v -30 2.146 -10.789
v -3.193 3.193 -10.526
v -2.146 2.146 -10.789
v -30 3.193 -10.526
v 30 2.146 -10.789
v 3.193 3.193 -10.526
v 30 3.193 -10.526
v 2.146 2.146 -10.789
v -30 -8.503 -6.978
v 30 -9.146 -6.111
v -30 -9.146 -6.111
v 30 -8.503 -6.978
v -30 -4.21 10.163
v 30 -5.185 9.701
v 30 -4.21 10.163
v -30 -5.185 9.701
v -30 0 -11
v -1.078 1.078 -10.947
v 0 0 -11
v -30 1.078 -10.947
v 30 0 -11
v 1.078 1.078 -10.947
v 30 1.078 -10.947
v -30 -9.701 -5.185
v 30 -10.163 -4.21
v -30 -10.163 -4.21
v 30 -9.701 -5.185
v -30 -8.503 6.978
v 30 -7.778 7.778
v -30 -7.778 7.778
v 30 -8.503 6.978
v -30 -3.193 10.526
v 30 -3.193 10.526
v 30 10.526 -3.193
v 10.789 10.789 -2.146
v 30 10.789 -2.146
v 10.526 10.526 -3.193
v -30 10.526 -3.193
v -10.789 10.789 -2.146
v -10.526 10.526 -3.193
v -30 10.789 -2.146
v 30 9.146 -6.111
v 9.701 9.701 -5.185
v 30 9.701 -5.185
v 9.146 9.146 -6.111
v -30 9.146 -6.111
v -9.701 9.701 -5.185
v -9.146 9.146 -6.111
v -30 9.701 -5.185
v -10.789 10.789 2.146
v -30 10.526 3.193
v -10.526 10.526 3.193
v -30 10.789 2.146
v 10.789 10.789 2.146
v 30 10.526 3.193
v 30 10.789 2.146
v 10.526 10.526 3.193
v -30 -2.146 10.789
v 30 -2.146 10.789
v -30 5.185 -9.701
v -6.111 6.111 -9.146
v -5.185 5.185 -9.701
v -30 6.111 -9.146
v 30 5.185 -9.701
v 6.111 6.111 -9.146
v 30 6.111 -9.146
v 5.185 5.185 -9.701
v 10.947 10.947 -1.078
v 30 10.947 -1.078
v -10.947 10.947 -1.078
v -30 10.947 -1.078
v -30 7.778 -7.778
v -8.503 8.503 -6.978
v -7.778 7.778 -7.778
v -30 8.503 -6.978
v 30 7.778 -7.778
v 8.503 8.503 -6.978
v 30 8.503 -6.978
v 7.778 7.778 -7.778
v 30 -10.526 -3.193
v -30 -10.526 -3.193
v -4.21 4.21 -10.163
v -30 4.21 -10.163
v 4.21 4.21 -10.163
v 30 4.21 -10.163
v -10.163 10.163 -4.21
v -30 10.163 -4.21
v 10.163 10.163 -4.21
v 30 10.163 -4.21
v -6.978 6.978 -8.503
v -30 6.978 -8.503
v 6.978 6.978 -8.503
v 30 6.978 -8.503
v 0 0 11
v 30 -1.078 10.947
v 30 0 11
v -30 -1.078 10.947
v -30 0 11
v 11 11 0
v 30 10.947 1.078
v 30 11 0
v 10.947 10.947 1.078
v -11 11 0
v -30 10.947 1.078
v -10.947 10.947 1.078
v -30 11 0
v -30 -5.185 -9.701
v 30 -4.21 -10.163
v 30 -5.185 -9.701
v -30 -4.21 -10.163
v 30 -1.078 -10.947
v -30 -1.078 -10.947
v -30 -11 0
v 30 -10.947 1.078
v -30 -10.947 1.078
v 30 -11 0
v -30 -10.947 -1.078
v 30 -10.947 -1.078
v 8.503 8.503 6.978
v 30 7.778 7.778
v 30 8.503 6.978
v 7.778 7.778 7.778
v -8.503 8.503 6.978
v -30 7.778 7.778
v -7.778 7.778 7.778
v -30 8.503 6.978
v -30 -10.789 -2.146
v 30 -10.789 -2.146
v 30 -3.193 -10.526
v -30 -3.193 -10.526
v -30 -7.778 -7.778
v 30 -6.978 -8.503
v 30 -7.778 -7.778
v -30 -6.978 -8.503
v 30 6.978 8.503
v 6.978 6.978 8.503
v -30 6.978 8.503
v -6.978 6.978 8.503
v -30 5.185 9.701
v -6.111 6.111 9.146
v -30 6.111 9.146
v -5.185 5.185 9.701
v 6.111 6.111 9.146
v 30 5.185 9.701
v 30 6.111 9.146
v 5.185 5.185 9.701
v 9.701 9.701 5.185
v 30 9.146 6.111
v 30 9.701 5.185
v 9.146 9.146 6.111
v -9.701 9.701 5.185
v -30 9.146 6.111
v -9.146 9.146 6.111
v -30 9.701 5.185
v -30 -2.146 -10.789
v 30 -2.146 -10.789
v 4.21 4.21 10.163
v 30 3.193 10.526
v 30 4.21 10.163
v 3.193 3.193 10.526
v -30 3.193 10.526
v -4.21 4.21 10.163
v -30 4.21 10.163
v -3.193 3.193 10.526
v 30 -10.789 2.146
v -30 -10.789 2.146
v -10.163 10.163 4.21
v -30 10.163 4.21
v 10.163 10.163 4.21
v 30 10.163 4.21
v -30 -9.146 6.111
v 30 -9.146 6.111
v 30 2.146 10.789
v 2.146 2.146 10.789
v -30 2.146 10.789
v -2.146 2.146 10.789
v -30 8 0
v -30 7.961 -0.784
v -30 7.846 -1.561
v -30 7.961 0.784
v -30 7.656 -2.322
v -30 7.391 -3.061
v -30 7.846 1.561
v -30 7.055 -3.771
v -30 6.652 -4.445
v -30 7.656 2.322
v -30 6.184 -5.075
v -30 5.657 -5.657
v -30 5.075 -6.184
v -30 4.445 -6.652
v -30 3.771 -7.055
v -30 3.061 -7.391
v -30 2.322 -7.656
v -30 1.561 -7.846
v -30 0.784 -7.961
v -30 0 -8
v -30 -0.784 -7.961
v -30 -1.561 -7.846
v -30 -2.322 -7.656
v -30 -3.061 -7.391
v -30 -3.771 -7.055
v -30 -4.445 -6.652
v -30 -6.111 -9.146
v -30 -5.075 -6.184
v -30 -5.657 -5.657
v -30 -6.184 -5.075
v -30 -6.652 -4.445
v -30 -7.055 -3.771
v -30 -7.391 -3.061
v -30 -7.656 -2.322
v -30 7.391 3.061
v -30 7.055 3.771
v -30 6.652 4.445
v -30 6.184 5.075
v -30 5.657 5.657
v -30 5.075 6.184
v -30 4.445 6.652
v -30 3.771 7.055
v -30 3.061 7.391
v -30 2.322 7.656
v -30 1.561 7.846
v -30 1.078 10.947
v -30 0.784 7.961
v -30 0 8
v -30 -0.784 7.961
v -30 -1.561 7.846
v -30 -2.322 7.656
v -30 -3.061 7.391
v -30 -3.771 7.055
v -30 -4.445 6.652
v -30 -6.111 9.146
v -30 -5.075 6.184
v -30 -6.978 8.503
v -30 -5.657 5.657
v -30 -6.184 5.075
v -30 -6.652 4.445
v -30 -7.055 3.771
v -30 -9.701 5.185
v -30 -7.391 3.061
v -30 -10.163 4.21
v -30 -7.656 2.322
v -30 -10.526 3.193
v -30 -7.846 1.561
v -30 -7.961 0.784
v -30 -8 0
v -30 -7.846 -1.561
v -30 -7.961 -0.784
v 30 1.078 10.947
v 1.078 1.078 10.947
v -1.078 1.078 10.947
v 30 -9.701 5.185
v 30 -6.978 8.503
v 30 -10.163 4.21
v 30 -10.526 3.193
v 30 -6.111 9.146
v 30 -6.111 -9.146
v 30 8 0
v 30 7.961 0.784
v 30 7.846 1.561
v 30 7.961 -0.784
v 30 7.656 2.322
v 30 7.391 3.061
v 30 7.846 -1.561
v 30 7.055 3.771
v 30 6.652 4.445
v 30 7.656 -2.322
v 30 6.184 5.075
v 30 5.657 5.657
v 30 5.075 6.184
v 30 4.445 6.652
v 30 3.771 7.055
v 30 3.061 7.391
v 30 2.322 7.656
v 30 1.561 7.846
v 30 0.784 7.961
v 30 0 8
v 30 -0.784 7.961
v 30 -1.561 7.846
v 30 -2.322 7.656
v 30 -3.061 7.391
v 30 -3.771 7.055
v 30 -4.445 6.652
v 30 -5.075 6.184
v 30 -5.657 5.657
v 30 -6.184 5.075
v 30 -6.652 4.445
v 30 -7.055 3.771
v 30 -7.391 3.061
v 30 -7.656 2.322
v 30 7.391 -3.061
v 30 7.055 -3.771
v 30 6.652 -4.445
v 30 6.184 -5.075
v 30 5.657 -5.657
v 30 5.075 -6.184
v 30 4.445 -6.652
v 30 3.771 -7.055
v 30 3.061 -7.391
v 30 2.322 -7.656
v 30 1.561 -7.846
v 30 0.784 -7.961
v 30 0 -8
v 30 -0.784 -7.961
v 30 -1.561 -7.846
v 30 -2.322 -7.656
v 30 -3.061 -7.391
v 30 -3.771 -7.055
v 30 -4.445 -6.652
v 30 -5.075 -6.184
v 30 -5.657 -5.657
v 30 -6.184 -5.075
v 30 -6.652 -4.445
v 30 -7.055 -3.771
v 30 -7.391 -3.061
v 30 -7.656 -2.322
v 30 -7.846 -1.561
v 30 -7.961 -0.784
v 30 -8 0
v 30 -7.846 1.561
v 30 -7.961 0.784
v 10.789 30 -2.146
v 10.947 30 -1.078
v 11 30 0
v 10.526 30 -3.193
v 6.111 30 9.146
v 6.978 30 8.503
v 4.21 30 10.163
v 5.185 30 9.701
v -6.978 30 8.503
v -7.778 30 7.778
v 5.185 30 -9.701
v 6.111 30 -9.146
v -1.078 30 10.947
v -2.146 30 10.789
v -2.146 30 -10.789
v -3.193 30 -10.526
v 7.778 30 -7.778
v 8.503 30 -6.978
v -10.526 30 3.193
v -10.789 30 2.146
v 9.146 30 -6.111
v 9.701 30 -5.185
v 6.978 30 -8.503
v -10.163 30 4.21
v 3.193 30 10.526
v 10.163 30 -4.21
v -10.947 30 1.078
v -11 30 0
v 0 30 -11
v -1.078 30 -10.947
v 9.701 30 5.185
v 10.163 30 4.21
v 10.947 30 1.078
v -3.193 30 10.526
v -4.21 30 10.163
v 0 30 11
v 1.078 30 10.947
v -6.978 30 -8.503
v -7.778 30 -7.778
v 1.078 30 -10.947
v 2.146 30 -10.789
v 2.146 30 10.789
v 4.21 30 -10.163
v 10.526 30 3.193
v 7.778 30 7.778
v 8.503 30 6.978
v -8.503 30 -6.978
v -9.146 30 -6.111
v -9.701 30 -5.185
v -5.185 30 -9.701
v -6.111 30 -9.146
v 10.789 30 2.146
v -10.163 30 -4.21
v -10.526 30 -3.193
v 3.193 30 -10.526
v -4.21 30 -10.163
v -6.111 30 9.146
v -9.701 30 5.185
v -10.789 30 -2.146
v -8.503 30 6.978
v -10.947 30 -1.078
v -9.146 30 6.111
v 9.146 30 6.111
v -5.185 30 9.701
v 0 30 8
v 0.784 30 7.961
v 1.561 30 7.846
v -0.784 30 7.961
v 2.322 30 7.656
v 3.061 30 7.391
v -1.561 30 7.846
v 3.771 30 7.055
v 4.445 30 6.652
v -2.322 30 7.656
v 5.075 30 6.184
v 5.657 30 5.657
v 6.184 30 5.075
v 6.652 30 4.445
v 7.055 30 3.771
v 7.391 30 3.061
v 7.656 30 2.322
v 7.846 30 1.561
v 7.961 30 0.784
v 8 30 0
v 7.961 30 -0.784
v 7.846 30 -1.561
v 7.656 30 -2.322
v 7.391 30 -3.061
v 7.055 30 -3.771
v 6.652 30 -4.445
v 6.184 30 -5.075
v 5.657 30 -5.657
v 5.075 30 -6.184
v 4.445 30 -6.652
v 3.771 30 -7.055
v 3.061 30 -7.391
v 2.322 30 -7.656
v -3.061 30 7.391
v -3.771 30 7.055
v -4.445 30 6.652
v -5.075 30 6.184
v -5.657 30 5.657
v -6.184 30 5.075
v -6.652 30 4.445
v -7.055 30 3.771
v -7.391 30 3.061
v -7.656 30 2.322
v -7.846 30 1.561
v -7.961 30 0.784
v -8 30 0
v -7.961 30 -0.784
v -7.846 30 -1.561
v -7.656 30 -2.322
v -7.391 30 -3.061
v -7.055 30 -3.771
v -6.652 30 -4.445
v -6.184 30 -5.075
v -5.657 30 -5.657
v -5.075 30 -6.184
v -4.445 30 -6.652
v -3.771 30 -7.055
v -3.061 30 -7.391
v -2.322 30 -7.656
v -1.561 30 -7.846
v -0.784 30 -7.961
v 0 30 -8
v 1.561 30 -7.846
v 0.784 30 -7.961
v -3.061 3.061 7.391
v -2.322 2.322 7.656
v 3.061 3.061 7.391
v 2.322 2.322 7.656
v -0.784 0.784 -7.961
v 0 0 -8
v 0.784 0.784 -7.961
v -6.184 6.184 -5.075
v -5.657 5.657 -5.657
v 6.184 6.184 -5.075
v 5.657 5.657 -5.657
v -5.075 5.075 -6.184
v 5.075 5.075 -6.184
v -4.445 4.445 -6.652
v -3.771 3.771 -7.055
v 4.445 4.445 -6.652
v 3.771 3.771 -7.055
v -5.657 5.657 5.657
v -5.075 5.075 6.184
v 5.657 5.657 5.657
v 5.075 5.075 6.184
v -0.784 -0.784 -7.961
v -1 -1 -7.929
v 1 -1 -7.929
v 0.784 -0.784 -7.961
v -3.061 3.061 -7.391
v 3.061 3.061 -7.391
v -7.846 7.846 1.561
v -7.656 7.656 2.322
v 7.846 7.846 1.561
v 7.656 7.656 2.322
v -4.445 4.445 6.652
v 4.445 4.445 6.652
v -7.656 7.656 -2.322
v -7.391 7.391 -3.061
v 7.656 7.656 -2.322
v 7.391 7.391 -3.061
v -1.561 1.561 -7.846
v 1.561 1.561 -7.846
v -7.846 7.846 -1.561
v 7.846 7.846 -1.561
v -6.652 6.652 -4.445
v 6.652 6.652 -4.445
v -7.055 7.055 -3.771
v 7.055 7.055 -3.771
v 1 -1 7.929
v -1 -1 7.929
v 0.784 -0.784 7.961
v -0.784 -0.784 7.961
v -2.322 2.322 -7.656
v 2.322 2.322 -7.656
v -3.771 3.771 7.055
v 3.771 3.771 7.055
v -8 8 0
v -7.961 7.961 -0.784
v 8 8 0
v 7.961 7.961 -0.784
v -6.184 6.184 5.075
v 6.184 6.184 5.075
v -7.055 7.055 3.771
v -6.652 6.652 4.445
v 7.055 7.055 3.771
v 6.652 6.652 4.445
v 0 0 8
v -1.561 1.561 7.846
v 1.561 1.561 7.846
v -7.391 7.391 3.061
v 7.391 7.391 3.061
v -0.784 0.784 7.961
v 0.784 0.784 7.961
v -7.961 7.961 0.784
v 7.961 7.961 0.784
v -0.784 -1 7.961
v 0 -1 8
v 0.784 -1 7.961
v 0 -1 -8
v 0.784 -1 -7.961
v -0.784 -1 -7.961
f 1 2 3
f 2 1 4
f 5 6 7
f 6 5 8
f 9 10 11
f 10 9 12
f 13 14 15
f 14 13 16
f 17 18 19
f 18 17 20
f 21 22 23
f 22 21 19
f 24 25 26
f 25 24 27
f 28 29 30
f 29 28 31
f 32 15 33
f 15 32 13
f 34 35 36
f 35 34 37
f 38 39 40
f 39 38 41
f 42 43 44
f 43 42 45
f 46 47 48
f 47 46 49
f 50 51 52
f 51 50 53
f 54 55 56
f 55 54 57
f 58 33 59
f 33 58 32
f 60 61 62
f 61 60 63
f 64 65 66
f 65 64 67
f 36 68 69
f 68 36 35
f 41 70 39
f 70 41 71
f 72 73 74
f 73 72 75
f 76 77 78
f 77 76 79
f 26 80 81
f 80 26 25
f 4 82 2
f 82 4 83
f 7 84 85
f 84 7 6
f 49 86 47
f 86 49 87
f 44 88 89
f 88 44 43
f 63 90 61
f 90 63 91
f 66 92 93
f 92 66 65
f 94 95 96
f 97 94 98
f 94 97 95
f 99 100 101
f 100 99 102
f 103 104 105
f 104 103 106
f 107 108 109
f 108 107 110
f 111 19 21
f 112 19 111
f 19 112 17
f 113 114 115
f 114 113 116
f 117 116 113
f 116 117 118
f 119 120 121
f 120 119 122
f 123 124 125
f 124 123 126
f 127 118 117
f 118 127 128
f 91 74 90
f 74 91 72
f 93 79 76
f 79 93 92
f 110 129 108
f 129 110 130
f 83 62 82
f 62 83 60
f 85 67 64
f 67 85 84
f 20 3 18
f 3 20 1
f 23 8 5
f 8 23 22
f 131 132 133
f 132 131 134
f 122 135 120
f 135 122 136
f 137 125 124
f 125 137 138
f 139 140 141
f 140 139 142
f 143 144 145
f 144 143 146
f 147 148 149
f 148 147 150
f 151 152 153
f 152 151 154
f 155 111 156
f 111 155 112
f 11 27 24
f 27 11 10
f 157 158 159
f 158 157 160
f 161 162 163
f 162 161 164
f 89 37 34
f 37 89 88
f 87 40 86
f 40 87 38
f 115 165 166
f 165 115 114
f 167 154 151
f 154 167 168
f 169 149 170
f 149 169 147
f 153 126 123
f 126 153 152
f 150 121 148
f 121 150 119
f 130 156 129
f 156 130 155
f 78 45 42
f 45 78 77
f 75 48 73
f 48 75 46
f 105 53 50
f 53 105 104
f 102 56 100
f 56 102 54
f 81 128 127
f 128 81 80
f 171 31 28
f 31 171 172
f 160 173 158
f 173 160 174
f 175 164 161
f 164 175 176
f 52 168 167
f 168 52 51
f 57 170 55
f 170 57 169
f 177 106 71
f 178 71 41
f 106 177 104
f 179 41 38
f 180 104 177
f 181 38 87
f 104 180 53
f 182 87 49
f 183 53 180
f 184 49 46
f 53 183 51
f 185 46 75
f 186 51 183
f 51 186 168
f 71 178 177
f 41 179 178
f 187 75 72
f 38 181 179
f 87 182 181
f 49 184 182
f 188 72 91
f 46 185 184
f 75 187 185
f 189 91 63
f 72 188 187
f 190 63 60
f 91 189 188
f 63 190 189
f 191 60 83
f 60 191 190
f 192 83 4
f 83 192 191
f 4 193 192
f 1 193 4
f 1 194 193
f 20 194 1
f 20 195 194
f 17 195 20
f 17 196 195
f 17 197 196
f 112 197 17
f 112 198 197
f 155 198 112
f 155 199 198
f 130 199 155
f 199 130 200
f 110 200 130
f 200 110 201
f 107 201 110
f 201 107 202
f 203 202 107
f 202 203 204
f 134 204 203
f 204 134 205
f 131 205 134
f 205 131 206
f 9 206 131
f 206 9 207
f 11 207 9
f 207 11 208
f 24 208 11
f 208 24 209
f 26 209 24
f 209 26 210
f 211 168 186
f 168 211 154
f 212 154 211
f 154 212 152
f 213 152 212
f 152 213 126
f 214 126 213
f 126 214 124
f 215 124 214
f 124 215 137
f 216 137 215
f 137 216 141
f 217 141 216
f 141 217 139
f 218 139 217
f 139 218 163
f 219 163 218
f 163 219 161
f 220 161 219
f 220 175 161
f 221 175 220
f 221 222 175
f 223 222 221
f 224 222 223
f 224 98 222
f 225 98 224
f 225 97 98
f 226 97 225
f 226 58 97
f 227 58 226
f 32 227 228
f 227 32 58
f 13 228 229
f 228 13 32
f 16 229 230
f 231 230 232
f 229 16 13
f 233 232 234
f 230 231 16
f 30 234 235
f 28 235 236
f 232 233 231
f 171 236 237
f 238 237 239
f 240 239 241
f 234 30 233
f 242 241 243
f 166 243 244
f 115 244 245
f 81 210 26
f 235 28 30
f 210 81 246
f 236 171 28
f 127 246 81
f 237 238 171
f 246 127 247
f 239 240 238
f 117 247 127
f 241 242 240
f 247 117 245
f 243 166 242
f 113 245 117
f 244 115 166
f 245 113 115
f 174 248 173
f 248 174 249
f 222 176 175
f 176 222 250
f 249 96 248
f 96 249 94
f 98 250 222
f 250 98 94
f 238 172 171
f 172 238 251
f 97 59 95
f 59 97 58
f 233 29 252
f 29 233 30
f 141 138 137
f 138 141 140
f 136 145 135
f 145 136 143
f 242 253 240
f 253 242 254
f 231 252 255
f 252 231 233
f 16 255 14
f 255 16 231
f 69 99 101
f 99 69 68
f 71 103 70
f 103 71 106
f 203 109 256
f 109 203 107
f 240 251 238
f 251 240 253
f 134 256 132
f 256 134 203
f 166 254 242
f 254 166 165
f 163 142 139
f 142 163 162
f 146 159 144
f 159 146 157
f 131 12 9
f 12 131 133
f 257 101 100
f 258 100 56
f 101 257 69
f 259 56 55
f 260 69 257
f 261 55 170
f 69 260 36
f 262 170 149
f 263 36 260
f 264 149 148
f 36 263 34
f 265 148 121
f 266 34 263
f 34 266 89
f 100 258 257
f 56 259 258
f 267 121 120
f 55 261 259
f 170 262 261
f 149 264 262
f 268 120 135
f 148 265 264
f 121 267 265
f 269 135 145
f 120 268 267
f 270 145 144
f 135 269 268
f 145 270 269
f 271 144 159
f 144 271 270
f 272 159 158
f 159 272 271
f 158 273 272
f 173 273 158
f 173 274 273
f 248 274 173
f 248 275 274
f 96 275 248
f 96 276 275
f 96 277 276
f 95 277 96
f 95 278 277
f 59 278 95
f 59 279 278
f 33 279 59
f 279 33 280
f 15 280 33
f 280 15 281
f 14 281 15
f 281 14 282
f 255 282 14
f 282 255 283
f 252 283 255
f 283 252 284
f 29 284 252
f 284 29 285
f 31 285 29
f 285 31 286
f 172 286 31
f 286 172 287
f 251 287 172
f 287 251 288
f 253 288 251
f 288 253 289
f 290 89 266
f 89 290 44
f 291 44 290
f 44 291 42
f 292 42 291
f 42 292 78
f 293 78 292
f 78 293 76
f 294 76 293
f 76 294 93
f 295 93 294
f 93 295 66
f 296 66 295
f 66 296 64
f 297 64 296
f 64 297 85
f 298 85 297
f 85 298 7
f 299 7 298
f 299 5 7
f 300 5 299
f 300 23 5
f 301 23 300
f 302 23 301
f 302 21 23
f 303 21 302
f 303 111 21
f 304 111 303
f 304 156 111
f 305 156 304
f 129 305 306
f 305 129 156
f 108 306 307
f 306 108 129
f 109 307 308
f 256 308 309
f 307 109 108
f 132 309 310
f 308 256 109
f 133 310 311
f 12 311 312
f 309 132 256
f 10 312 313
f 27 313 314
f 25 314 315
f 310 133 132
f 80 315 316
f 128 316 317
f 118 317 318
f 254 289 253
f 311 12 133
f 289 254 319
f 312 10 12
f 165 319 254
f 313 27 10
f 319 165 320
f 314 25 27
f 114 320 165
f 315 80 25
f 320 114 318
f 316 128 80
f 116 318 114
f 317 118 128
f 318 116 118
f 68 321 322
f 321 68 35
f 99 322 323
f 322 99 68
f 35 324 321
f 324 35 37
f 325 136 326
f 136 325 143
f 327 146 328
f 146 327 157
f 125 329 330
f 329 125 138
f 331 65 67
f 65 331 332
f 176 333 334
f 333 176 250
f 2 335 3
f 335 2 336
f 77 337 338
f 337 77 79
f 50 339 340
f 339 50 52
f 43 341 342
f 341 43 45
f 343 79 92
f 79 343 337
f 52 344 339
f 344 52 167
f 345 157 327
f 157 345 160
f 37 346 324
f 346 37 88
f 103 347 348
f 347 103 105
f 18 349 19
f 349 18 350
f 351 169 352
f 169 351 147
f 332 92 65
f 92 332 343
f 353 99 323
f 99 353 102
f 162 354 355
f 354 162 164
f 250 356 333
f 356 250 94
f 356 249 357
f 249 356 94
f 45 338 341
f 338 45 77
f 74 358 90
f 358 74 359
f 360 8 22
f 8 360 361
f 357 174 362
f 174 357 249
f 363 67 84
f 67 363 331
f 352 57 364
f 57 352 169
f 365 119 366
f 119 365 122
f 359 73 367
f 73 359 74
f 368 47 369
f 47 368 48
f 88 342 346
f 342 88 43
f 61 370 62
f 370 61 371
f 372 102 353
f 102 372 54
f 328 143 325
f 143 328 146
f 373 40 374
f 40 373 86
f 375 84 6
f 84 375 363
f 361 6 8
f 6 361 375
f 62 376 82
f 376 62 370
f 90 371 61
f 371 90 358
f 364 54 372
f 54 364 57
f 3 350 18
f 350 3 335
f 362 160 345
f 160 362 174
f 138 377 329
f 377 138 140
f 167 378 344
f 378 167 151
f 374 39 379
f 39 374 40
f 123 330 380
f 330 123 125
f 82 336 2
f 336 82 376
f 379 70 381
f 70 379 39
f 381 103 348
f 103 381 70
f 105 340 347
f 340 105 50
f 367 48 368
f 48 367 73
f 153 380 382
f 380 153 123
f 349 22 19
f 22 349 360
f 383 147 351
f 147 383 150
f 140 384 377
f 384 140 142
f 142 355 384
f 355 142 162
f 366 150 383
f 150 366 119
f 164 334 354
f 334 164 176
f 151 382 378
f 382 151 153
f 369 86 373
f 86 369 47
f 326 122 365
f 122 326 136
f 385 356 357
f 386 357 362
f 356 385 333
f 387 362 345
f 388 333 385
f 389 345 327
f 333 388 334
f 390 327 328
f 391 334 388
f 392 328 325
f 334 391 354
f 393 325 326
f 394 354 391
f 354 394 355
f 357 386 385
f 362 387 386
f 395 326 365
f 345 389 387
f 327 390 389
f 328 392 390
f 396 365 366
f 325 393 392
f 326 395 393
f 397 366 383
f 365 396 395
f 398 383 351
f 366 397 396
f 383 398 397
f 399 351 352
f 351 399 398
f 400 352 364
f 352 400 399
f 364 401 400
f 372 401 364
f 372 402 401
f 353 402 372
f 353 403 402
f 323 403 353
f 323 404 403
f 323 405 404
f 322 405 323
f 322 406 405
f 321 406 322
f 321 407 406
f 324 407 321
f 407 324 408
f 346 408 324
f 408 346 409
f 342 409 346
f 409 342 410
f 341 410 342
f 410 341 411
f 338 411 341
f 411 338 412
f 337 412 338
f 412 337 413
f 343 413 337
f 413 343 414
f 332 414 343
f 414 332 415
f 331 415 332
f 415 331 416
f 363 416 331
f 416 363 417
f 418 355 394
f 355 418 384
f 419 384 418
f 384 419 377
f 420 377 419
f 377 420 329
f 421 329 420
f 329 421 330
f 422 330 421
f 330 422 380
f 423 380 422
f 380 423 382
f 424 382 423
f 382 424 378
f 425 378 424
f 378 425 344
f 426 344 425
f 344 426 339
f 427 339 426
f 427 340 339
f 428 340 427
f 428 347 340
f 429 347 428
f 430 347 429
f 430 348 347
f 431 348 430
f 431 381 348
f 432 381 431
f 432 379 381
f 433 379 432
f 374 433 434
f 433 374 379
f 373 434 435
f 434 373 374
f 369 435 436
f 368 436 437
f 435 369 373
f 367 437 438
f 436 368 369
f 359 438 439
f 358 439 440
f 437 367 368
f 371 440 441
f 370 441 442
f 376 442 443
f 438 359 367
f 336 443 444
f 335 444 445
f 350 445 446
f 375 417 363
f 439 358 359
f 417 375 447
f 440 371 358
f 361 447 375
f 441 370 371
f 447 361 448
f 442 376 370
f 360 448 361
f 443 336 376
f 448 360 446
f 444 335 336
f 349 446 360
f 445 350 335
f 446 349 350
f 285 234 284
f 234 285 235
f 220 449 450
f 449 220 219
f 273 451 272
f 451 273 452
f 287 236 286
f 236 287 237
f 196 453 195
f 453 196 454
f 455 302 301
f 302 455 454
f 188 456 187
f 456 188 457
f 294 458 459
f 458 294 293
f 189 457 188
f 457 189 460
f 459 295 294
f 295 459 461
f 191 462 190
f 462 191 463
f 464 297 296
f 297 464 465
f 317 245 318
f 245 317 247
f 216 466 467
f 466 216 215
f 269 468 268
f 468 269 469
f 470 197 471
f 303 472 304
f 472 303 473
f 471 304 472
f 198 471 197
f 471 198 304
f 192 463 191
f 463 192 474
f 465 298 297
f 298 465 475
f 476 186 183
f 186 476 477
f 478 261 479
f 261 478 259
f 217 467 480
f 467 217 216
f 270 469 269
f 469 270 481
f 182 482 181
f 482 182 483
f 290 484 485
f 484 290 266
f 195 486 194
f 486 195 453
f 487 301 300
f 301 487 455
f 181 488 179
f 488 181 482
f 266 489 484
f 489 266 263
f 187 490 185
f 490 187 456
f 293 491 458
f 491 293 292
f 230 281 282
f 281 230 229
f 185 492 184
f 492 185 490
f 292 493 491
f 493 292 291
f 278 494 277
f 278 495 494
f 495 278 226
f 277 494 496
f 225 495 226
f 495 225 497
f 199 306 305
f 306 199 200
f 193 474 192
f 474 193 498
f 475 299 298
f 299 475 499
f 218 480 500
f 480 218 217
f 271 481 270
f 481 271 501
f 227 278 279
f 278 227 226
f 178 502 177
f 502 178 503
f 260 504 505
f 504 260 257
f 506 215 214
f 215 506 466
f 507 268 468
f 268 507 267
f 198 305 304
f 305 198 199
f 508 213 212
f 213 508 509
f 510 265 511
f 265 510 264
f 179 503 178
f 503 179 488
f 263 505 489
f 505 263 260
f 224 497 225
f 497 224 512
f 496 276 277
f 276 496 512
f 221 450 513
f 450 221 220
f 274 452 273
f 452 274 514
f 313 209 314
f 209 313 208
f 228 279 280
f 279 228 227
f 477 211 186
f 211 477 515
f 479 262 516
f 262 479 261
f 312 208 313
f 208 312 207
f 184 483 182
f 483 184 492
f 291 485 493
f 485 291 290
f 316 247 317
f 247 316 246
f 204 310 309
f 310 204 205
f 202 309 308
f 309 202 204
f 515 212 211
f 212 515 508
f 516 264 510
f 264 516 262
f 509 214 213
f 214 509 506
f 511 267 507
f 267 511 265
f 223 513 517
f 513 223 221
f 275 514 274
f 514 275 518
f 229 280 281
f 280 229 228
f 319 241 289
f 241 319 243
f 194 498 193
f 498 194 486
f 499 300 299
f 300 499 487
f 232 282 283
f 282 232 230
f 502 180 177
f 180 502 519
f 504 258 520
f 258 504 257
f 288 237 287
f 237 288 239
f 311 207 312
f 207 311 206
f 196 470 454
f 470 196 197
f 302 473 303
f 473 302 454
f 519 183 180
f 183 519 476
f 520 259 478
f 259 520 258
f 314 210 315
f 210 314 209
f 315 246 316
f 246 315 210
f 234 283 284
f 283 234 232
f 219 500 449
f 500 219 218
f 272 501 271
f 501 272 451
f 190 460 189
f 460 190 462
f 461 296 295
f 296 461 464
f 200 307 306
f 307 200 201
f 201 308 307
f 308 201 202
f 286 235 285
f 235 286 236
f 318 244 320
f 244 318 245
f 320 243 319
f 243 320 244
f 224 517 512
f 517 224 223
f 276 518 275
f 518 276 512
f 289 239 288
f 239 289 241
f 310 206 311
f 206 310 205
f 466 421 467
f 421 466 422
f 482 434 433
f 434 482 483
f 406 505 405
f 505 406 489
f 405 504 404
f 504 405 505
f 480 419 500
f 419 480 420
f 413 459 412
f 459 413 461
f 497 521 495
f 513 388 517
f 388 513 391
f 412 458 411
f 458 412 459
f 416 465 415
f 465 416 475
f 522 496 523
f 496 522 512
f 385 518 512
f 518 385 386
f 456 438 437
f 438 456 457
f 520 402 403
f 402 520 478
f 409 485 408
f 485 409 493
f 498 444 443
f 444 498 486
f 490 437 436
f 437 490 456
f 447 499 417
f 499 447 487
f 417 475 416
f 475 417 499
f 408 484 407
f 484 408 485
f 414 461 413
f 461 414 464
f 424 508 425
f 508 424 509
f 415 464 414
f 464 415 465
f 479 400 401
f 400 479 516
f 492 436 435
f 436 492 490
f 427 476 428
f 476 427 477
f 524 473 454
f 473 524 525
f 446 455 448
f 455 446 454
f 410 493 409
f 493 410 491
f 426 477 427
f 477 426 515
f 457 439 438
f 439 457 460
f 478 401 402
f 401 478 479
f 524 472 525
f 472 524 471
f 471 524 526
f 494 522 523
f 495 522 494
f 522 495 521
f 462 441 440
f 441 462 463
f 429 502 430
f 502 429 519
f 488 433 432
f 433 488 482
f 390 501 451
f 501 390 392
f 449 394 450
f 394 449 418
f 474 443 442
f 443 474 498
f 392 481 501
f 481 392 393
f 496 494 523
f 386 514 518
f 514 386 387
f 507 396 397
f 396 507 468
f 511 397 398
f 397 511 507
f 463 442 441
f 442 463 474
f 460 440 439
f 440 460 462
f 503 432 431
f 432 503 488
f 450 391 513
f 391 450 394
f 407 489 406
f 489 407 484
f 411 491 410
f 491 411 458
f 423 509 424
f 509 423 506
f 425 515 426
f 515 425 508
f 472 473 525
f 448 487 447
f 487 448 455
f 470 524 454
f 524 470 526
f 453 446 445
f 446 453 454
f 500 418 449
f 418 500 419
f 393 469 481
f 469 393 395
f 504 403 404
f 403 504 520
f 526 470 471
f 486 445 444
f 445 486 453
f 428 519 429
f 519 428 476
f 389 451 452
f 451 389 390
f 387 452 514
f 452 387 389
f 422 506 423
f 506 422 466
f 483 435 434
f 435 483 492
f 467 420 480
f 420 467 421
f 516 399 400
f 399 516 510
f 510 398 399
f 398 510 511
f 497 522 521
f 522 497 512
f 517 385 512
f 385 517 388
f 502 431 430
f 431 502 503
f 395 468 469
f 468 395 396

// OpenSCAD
// T pipe connector - a tee joining three tube ends, hollow through. NOVEL general part.
//
// @desc T pipe connector joining three tube ends
// @prompt Design a T pipe connector in OpenSCAD: a tee for tubes of {bore} mm inner diameter with {wall} mm walls, the straight run {run} mm long and the branch {branch} mm long. Reply with a single complete OpenSCAD file.
// @param bore   tube inner diameter, mm  [6:40]
// @param wall   wall thickness, mm       [1.5:5]
// @param run    run length, mm           [30:100]
// @param branch branch length, mm        [15:60]

bore   = 16;
wall   = 3;
run    = 60;
branch = 30;

$fn = 64;

od = bore + 2 * wall;

difference() {
    union() {
        translate([-run / 2, 0, 0]) rotate([0, 90, 0]) cylinder(h = run, d = od);   // run along X
        rotate([-90, 0, 0]) cylinder(h = branch, d = od);                            // branch along +Y
    }
    translate([-run / 2 - 1, 0, 0]) rotate([0, 90, 0]) cylinder(h = run + 2, d = bore);
    rotate([-90, 0, 0]) translate([0, 0, -1]) cylinder(h = branch + 2, d = bore);
}
